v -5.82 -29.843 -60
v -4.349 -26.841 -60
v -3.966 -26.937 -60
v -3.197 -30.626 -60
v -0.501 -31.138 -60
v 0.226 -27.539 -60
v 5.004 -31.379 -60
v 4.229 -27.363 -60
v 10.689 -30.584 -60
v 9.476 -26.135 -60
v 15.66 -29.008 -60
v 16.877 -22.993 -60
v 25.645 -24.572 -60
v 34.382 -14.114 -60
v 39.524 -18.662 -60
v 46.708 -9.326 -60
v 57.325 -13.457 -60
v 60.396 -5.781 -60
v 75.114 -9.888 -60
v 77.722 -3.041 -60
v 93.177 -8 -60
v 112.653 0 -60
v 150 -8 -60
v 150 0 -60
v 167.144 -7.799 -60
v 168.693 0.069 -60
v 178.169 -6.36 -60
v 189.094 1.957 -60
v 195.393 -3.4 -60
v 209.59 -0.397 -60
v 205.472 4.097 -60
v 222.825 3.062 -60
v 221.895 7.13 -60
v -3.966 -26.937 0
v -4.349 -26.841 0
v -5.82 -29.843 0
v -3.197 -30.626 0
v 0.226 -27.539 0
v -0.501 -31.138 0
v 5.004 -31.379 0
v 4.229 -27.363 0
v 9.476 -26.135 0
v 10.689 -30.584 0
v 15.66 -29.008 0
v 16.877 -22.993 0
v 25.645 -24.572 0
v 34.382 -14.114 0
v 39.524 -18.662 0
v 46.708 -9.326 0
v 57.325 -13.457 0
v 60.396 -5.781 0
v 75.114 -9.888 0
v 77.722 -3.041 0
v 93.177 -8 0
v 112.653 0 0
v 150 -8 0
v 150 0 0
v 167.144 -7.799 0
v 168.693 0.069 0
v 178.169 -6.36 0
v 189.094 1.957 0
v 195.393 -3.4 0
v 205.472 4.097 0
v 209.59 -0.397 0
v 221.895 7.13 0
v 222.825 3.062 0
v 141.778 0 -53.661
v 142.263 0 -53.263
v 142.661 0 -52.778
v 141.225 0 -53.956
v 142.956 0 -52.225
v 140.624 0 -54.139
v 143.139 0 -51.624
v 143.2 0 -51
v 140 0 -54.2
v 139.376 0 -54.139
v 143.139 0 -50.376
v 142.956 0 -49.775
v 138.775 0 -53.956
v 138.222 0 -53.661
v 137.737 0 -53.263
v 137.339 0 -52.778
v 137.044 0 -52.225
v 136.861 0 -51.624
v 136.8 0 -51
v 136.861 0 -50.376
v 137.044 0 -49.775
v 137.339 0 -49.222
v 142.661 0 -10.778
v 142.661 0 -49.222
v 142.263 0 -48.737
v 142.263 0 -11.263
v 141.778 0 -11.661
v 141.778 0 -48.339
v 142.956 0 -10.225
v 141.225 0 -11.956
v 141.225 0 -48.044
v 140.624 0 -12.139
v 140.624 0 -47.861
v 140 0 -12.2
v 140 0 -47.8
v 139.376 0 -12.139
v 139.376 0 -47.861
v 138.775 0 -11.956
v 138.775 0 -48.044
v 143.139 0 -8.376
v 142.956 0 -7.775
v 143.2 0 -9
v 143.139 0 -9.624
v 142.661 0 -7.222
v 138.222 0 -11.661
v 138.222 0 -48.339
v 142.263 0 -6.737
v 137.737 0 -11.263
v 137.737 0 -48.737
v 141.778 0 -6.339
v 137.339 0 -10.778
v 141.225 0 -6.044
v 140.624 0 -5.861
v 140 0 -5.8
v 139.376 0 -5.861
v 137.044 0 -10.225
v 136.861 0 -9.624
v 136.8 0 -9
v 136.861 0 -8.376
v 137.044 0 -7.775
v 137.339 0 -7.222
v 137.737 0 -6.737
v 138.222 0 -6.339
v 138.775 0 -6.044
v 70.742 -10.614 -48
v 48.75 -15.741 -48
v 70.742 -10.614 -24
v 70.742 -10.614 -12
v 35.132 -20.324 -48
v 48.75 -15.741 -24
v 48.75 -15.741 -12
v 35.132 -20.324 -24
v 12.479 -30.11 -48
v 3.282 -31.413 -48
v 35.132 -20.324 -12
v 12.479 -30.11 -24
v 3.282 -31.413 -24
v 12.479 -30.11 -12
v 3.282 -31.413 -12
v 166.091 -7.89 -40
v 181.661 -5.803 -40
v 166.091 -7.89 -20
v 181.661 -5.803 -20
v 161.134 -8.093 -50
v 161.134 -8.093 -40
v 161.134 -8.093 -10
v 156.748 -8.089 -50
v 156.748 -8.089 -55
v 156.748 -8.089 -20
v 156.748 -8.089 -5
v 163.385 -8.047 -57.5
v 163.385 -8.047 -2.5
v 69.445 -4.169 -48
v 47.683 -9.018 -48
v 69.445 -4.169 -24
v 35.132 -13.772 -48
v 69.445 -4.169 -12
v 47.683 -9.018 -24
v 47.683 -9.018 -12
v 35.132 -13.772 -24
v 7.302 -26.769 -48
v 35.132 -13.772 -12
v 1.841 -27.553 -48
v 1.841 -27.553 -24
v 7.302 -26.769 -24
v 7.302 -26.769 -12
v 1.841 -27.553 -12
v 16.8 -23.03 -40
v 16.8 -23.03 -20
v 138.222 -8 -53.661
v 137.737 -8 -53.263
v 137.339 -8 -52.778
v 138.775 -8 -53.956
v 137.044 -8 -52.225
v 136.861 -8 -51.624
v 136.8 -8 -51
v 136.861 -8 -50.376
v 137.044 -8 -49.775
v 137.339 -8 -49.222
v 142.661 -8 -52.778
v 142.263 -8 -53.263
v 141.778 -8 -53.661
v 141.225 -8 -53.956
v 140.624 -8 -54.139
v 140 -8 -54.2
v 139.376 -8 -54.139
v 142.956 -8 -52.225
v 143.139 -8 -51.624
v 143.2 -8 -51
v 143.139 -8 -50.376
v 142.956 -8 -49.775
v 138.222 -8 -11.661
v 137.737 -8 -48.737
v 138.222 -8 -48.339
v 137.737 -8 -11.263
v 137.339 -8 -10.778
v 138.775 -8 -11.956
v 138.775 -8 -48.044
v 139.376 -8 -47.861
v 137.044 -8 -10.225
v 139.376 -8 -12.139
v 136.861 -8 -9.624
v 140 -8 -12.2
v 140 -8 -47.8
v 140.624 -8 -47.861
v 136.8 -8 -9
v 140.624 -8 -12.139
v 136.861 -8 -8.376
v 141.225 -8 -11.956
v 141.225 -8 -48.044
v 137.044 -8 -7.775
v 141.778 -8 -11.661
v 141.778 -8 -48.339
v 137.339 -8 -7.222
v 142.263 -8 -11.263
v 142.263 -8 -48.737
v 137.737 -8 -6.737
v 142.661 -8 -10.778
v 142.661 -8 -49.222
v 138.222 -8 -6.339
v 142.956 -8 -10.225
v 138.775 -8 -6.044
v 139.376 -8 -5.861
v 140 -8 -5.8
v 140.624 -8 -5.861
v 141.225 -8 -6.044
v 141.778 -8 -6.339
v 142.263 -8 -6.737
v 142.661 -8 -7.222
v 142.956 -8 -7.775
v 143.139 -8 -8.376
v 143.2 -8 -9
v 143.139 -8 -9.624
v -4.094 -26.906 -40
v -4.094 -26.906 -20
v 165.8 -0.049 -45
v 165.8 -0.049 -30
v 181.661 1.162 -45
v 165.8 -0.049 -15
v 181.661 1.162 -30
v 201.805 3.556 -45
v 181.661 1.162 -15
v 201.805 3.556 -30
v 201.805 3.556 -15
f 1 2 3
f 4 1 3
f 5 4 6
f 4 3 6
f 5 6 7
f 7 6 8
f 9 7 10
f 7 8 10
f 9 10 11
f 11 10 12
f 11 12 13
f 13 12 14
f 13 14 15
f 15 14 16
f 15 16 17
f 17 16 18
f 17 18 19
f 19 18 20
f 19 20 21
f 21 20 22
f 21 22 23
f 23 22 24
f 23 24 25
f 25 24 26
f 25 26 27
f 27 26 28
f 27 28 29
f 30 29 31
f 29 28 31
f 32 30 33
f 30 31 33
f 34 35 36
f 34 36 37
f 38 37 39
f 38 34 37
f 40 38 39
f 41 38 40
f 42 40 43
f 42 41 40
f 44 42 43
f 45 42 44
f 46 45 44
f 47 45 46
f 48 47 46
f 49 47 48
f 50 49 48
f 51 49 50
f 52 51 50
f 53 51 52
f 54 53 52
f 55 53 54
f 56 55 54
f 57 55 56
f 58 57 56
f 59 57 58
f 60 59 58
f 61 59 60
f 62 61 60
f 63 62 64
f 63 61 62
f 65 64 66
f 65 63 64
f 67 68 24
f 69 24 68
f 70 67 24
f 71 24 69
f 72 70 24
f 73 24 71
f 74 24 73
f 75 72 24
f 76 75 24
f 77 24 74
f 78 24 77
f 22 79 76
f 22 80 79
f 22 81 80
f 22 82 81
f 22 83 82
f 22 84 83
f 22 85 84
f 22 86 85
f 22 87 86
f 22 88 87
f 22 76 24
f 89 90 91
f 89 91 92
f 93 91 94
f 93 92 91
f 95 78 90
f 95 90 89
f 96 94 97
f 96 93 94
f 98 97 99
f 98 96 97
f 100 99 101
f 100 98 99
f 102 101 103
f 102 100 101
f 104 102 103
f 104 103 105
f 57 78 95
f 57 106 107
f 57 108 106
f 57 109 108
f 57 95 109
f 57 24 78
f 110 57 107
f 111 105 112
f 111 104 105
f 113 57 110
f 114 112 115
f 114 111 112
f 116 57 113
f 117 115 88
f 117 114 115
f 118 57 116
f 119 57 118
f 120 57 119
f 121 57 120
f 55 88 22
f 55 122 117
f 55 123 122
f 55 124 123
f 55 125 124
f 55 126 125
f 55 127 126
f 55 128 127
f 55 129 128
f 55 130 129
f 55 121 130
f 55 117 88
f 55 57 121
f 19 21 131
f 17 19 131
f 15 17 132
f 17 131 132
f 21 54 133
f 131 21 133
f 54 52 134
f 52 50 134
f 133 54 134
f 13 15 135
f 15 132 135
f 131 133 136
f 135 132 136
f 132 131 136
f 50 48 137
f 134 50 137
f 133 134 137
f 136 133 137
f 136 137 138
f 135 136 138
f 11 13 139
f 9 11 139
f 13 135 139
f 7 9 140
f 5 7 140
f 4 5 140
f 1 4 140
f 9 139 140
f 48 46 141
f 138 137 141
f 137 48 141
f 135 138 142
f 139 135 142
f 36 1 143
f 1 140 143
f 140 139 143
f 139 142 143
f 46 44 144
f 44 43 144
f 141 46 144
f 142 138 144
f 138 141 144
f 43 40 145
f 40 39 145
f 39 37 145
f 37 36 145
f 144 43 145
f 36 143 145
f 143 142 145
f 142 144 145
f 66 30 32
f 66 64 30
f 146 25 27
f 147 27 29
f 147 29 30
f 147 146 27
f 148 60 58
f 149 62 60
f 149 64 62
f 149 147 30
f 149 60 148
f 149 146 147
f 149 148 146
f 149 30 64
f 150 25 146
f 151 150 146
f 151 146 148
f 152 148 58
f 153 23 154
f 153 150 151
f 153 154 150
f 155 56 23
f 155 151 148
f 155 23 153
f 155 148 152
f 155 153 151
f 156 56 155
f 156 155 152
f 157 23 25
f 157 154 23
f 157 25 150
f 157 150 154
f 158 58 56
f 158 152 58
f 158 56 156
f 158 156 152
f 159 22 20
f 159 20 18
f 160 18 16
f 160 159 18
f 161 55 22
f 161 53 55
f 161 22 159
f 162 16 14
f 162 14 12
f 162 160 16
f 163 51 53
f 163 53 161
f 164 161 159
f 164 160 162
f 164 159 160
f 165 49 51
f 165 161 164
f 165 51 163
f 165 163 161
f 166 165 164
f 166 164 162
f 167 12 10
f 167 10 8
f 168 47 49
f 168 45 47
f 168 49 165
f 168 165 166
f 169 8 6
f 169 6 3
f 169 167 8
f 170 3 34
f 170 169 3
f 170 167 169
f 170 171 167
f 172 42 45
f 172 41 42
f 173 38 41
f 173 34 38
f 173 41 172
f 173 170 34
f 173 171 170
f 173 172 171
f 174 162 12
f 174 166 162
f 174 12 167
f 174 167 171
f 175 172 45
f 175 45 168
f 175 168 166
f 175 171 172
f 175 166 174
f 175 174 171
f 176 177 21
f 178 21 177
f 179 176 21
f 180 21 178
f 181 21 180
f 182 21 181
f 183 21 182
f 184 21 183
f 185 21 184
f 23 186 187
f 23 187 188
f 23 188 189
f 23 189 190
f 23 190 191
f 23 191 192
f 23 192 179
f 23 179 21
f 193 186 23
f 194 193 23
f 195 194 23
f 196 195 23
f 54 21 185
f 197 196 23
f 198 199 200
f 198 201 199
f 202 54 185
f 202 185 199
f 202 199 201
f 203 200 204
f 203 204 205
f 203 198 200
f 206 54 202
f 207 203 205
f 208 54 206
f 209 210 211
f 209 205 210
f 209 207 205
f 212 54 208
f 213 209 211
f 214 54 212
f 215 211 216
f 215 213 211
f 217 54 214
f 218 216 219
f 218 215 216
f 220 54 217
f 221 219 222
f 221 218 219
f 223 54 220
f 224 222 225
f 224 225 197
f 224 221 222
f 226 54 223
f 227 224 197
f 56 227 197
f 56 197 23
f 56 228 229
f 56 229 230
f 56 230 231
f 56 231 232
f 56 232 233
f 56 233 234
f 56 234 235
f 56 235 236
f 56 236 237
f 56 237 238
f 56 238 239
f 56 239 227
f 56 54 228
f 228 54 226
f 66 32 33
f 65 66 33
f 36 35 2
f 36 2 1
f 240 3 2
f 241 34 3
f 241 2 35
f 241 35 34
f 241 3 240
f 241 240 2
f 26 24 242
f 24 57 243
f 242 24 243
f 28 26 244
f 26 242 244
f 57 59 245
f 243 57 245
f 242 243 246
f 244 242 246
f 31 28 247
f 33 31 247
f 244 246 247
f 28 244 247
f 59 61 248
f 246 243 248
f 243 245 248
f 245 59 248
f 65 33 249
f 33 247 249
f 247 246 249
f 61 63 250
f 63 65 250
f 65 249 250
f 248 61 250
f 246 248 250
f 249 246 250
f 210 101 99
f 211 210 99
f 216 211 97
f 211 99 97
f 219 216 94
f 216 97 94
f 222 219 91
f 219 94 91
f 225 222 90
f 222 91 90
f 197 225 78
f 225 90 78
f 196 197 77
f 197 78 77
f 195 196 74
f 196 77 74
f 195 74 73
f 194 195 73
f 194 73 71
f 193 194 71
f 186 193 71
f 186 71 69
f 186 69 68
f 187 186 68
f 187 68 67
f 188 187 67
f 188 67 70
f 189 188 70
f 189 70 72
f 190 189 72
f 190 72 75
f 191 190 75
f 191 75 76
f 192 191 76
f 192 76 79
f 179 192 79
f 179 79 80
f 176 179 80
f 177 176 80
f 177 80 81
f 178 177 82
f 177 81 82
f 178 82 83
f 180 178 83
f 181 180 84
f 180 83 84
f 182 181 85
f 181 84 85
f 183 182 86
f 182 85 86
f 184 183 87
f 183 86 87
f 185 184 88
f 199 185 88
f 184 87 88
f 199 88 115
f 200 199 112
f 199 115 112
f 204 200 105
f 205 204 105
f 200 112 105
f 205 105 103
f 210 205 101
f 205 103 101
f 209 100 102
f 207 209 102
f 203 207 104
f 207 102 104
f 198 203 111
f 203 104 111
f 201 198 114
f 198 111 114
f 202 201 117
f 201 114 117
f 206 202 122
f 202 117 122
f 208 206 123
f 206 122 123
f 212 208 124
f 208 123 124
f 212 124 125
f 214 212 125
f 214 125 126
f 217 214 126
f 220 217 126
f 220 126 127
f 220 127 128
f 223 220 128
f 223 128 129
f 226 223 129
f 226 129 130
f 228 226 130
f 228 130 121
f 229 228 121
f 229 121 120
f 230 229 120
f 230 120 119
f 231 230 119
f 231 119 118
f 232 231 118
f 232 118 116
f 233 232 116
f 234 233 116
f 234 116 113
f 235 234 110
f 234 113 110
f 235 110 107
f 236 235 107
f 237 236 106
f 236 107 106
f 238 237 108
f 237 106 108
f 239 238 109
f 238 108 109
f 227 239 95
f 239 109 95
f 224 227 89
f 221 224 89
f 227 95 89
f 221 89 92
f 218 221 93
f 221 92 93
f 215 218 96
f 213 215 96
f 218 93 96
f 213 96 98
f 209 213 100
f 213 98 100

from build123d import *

# Parameters (mm, degrees)
ESTRUSIONE_ESTRUSIONE1_DEPTH = 60
SCHIZZO2_R                   = 3.2
TAGLIO_ESTRUSIONE1_DEPTH     = 233.889820397


with BuildPart() as part:
    # Schizzo1 → Estrusione-Estrusione1 (new body)
    with BuildSketch(Plane.XY):
        with BuildLine():
            Line((150, 0), (112.652759777, 0))
            add(Edge.make_bspline(
                [(112.652759777, 0), (98.237662575, -1.178240864), (76.325416845, -2.367087178), (50.386085211, -7.715299834), (33.034853179, -14.26020997), (17.005808568, -23.385929695), (4.046336606, -28.877814003), (-3.966333357, -26.937004661)],
                knots=[0, 0, 0, 0, 0.357718306, 0.541412235, 0.651991695, 0.814467727, 0.997098774, 0.997098774, 0.997098774, 0.997098774], degree=3))
            add(Edge.make_bspline(
                [(-3.966333357, -26.937004661), (-4.093620386, -26.906173508), (-4.221198761, -26.874119155), (-4.34907219, -26.840823763)],
                knots=[0.997098774, 0.997098774, 0.997098774, 0.997098774, 1, 1, 1, 1], degree=3))
            Line((-4.34907219, -26.840823763), (-5.819646619, -29.843392582))
            add(Edge.make_bspline(
                [(93.176931163, -8), (78.095796931, -8.806994611), (58.515182539, -12.465092597), (33.425903267, -20.492787938), (21.868566108, -26.59175254), (8.46872535, -31.84989808), (-0.020847935, -31.917998972), (-5.819646619, -29.843392582)],
                knots=[0, 0, 0, 0, 0.439768474, 0.579665595, 0.767580002, 0.820026739, 1, 1, 1, 1], degree=3))
            Line((93.176931163, -8), (150, -8))
            add(Edge.make_bspline(
                [(150, -8), (160.934675431, -8.178500572), (167.732636416, -7.981403235), (191.218183044, -4.400657167), (208.863871924, -0.957960193), (222.824656402, 3.062271003)],
                knots=[0, 0, 0, 0, 0.132806244, 0.367168858, 1, 1, 1, 1], degree=3))
            Line((222.824656402, 3.062271003), (221.895107654, 7.130147587))
            add(Edge.make_bspline(
                [(150, 0), (155.186432149, -0.071874262), (162.776030143, -0.192676418), (171.94252973, 0.198053168), (191.054206551, 2.042329396), (208.370998681, 4.160926661), (221.895107654, 7.130147587)],
                knots=[0, 0, 0, 0, 0.180513483, 0.221559148, 0.410456652, 1, 1, 1, 1], degree=3))
        make_face()
    extrude(amount=-ESTRUSIONE_ESTRUSIONE1_DEPTH)

    # Schizzo2 → Taglio-Estrusione1 (cut, through all)
    with BuildSketch(Plane(origin=(0, 0, 0), x_dir=(1, 0, 0), z_dir=(0, 1, 0))):
        with Locations(Location((140, 51, 0), (0, 0, 270))):
            Circle(SCHIZZO2_R)
        with Locations(Location((140, 9, 0), (0, 0, 90))):
            Circle(SCHIZZO2_R)
    extrude(amount=-TAGLIO_ESTRUSIONE1_DEPTH, mode=Mode.SUBTRACT)


solid = part.part
